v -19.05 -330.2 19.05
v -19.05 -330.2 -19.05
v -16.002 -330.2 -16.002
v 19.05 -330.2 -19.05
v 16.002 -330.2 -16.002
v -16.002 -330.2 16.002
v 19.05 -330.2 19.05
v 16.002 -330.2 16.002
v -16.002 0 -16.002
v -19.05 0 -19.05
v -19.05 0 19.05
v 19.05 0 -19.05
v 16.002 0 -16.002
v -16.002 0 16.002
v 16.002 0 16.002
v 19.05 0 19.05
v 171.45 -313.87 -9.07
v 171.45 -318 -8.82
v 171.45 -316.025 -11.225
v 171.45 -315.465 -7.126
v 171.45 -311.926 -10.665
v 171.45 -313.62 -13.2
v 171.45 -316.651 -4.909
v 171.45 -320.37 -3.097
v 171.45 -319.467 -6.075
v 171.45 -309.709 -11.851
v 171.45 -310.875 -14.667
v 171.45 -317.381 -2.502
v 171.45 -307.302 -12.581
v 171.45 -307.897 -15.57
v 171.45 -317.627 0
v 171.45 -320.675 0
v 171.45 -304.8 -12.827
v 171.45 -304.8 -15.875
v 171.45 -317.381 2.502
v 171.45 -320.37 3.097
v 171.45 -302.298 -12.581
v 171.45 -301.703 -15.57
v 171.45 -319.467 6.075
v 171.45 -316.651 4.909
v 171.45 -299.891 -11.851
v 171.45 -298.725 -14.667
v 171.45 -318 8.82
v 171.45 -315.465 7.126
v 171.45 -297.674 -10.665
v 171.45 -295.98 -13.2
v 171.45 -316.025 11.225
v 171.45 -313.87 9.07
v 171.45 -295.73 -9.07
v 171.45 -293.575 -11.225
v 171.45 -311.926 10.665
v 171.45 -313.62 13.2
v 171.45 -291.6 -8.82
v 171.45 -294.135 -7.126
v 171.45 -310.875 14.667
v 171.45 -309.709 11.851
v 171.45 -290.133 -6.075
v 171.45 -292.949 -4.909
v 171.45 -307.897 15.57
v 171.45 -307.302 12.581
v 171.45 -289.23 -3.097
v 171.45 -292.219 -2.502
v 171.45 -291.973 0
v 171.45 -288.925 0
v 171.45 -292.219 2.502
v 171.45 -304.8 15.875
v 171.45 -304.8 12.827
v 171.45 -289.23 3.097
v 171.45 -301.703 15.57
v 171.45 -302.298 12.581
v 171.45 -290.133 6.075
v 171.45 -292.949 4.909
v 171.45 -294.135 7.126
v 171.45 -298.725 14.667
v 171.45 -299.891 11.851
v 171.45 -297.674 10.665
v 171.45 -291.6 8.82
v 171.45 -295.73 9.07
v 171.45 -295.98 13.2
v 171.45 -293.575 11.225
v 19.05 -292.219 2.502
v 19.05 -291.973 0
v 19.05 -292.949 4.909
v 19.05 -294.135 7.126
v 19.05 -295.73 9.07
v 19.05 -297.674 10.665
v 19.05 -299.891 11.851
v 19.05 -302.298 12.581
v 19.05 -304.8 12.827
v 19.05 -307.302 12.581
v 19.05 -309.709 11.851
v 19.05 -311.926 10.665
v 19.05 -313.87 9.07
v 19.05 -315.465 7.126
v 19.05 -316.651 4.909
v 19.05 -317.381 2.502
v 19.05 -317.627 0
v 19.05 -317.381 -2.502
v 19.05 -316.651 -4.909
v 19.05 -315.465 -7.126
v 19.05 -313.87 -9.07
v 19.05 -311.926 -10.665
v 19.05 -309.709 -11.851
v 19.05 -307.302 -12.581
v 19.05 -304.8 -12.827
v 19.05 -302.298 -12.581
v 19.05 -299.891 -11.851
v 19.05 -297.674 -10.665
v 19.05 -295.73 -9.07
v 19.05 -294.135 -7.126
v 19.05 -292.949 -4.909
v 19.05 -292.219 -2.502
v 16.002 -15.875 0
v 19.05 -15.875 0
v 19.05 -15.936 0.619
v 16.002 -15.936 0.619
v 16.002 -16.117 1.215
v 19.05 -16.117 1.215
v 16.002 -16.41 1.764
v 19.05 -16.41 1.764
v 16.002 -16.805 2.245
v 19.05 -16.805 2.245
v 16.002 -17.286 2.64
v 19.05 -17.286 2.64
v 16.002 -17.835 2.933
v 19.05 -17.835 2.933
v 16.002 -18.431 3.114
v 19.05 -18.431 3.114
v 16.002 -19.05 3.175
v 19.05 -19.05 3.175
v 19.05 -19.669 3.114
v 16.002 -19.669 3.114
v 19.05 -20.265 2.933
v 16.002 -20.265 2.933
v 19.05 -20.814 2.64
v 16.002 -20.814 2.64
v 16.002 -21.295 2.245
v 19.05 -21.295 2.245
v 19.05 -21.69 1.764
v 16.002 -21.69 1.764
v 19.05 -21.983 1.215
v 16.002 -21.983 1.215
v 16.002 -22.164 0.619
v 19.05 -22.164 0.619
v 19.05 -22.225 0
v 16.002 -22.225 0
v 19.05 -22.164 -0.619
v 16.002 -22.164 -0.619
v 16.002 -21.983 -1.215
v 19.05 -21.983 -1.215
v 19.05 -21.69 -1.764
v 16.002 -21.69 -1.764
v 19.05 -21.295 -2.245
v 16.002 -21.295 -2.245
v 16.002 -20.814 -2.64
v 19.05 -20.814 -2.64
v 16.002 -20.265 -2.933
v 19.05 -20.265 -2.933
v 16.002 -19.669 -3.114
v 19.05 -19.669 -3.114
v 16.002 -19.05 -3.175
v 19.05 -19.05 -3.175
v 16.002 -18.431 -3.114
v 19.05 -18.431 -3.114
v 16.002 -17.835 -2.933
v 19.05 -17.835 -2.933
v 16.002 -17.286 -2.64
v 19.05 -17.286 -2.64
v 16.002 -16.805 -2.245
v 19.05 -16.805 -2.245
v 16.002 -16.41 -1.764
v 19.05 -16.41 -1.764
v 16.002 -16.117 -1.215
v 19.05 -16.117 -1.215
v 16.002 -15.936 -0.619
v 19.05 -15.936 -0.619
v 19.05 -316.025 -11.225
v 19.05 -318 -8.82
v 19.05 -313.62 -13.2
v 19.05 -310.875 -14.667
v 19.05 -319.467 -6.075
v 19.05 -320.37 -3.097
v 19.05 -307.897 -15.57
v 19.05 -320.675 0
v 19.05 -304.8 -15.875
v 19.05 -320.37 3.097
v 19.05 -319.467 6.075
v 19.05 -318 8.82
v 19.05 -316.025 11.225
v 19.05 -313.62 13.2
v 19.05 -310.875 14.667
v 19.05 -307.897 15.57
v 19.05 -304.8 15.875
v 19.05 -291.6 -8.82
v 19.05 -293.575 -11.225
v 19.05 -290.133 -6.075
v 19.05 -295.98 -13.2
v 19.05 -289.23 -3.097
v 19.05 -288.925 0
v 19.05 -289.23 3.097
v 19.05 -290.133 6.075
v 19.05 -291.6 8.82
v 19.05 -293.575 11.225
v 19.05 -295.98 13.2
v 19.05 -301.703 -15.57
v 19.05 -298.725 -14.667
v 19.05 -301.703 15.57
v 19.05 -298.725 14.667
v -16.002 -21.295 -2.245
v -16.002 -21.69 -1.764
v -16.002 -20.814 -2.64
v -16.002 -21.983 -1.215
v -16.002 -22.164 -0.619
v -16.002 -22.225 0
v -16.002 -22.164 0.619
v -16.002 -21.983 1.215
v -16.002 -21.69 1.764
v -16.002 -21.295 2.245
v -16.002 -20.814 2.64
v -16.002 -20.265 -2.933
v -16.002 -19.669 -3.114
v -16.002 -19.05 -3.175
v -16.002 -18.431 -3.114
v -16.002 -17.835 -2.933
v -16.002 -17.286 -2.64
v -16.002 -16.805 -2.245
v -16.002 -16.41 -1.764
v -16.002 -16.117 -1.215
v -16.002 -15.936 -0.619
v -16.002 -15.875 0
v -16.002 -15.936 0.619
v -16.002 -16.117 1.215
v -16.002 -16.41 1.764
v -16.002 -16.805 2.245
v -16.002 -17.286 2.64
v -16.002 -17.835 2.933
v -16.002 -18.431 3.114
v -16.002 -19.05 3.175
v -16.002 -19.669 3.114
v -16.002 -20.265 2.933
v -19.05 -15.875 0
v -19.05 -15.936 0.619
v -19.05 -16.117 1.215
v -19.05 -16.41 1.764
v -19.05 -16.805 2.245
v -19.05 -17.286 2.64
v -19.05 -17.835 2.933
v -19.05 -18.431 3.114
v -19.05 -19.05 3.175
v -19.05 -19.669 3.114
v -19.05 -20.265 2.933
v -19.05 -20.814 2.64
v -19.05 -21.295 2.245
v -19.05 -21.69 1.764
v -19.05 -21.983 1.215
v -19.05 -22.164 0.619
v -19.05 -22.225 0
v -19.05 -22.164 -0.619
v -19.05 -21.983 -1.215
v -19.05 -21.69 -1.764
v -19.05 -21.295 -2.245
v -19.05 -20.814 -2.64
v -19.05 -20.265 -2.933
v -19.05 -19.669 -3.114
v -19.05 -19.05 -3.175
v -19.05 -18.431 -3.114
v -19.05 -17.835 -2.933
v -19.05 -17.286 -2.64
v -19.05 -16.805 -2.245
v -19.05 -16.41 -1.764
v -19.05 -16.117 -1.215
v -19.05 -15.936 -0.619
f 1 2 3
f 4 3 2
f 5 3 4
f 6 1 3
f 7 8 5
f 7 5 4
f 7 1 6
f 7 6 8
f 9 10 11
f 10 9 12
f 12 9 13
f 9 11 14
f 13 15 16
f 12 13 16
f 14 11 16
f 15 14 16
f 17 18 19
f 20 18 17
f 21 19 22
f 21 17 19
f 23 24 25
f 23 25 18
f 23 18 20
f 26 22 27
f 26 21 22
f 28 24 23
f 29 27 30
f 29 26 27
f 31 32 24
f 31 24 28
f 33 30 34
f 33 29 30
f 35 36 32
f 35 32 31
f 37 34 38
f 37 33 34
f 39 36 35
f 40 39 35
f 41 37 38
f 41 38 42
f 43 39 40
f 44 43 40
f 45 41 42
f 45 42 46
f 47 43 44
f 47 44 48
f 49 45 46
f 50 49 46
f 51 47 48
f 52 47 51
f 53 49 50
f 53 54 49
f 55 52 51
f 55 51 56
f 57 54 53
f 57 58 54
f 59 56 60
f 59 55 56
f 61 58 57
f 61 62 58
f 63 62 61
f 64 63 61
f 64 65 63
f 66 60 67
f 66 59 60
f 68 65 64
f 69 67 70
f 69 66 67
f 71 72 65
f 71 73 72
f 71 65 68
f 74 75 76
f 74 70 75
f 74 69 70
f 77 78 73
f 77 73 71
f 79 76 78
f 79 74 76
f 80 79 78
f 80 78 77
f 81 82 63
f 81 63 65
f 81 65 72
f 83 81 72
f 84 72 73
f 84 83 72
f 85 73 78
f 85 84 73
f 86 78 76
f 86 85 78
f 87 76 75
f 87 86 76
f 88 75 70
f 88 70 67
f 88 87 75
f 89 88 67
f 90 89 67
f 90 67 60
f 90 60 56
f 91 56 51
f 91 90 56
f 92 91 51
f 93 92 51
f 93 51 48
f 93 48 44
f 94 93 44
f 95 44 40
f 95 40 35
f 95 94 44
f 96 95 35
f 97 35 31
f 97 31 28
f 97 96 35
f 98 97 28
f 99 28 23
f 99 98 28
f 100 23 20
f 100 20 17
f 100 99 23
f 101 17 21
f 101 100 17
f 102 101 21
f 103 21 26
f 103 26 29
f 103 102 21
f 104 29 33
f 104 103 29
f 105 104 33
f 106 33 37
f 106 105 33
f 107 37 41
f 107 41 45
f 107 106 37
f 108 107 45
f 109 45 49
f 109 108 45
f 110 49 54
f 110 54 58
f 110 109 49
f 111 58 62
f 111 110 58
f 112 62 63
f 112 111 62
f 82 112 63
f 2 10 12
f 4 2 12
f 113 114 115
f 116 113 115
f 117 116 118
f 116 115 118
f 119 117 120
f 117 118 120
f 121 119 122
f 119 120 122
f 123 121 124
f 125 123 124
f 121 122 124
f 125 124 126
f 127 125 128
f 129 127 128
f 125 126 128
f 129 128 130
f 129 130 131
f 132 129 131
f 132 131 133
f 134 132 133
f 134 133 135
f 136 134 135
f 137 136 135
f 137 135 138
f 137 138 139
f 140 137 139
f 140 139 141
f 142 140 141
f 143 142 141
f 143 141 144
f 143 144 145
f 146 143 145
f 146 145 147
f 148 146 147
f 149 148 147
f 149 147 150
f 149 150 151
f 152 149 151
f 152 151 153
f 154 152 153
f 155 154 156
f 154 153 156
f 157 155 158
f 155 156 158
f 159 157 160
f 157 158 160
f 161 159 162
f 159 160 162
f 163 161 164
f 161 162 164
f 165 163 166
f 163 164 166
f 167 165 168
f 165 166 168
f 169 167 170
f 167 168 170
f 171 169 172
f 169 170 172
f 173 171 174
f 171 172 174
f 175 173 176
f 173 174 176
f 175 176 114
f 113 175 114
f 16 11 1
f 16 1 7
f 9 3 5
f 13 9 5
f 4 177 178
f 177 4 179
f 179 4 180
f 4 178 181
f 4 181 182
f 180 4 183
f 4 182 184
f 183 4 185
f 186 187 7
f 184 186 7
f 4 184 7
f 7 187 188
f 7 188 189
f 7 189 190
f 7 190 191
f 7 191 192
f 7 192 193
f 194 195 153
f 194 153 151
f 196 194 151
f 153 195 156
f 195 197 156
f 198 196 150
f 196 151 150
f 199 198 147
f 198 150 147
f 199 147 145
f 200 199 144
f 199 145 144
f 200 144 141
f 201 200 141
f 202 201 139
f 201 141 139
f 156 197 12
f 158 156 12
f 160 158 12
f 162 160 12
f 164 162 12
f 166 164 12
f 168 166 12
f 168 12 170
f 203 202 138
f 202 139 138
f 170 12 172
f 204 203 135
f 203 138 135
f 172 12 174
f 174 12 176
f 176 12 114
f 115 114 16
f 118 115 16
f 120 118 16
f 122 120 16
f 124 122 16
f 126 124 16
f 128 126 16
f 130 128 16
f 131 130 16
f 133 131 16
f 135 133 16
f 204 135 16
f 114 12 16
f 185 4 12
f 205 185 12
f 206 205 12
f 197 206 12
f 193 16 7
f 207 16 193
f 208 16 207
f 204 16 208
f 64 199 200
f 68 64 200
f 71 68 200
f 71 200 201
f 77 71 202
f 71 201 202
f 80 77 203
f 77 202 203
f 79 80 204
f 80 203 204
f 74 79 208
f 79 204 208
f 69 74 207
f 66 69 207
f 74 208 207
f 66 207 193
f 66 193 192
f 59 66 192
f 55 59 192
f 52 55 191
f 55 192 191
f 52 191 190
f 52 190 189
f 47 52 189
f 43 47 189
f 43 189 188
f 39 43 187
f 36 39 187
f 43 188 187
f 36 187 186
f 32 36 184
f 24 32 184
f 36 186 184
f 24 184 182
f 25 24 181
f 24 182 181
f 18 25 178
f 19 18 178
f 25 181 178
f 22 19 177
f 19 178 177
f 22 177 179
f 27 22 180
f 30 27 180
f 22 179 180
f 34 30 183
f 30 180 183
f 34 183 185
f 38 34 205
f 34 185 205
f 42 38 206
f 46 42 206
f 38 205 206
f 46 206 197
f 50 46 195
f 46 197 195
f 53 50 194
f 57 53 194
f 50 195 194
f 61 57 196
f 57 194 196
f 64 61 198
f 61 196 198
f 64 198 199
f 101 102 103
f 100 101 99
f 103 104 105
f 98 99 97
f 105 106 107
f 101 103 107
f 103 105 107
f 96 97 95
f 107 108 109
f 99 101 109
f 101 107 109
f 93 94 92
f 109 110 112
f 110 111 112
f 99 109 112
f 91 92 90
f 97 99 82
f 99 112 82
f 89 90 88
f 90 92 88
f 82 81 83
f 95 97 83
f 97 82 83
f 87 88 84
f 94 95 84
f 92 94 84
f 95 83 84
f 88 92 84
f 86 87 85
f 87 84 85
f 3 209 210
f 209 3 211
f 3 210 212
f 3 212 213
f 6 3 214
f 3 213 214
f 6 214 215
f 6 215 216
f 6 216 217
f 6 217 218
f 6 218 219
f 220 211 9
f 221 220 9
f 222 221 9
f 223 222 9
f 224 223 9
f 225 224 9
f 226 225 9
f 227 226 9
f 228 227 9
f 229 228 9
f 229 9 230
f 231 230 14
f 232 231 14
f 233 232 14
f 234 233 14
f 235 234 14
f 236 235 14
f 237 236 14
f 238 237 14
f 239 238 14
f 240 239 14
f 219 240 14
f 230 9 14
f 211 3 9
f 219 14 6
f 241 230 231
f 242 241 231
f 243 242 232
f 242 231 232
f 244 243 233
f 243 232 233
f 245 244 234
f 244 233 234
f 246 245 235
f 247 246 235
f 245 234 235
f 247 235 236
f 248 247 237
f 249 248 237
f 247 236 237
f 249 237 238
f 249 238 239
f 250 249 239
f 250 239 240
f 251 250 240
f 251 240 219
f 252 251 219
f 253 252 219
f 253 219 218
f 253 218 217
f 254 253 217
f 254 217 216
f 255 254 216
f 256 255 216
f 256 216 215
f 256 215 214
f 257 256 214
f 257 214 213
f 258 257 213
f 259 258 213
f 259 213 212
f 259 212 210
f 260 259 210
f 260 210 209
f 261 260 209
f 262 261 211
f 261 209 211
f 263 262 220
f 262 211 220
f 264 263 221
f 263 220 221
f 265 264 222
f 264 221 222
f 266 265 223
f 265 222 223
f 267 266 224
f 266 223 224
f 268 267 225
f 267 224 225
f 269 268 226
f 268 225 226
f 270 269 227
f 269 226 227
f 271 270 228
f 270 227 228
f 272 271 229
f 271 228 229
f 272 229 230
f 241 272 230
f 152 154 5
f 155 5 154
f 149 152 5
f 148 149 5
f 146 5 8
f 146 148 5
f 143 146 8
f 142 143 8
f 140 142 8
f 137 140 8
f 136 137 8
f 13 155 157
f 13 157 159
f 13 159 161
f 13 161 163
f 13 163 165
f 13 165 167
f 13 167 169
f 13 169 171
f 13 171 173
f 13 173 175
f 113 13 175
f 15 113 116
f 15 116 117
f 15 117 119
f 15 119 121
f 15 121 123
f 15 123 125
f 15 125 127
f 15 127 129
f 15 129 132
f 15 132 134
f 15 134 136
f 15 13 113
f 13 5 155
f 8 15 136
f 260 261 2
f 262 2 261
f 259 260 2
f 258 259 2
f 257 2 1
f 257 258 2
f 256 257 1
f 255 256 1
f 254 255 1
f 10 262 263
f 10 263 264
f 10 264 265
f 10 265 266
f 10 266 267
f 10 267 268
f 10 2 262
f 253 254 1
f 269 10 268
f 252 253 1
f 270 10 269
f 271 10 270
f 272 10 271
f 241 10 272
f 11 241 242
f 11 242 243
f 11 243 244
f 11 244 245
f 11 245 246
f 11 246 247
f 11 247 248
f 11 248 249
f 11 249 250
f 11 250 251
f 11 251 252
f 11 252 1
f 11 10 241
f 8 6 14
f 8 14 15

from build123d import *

# Parameters (mm, degrees)
F0_W     = 38.1
F0_H     = 38.1
F0_W_2   = 32.004
F0_H_2   = 32.004
F1_DEPTH = 330.2
F2_R     = 15.875
F2_R_2   = 12.827
F3_DEPTH = 152.4
F4_R     = 3.175
F5_DEPTH = 38.101


with BuildPart() as f1:
    # F0 (on Front) → F1 (new body)
    with BuildSketch(Plane.XZ):
        Rectangle(F0_W, F0_H)
        Rectangle(F0_W_2, F0_H_2, mode=Mode.SUBTRACT)
    extrude(amount=F1_DEPTH)

    # F2 (on face) → F3 (join)
    with BuildSketch(Plane.YZ.offset(19.05)):
        with Locations((-304.8, 0)):
            Circle(F2_R)
        with Locations((-304.8, 0)):
            Circle(F2_R_2, mode=Mode.SUBTRACT)
    extrude(amount=F3_DEPTH)

    # F4 (on face) → F5 (cut, through all)
    with BuildSketch(Plane.YZ.offset(19.05)):
        with Locations((-19.05, 0)):
            Circle(F4_R)
    extrude(amount=-F5_DEPTH, mode=Mode.SUBTRACT)


solid = f1.part
